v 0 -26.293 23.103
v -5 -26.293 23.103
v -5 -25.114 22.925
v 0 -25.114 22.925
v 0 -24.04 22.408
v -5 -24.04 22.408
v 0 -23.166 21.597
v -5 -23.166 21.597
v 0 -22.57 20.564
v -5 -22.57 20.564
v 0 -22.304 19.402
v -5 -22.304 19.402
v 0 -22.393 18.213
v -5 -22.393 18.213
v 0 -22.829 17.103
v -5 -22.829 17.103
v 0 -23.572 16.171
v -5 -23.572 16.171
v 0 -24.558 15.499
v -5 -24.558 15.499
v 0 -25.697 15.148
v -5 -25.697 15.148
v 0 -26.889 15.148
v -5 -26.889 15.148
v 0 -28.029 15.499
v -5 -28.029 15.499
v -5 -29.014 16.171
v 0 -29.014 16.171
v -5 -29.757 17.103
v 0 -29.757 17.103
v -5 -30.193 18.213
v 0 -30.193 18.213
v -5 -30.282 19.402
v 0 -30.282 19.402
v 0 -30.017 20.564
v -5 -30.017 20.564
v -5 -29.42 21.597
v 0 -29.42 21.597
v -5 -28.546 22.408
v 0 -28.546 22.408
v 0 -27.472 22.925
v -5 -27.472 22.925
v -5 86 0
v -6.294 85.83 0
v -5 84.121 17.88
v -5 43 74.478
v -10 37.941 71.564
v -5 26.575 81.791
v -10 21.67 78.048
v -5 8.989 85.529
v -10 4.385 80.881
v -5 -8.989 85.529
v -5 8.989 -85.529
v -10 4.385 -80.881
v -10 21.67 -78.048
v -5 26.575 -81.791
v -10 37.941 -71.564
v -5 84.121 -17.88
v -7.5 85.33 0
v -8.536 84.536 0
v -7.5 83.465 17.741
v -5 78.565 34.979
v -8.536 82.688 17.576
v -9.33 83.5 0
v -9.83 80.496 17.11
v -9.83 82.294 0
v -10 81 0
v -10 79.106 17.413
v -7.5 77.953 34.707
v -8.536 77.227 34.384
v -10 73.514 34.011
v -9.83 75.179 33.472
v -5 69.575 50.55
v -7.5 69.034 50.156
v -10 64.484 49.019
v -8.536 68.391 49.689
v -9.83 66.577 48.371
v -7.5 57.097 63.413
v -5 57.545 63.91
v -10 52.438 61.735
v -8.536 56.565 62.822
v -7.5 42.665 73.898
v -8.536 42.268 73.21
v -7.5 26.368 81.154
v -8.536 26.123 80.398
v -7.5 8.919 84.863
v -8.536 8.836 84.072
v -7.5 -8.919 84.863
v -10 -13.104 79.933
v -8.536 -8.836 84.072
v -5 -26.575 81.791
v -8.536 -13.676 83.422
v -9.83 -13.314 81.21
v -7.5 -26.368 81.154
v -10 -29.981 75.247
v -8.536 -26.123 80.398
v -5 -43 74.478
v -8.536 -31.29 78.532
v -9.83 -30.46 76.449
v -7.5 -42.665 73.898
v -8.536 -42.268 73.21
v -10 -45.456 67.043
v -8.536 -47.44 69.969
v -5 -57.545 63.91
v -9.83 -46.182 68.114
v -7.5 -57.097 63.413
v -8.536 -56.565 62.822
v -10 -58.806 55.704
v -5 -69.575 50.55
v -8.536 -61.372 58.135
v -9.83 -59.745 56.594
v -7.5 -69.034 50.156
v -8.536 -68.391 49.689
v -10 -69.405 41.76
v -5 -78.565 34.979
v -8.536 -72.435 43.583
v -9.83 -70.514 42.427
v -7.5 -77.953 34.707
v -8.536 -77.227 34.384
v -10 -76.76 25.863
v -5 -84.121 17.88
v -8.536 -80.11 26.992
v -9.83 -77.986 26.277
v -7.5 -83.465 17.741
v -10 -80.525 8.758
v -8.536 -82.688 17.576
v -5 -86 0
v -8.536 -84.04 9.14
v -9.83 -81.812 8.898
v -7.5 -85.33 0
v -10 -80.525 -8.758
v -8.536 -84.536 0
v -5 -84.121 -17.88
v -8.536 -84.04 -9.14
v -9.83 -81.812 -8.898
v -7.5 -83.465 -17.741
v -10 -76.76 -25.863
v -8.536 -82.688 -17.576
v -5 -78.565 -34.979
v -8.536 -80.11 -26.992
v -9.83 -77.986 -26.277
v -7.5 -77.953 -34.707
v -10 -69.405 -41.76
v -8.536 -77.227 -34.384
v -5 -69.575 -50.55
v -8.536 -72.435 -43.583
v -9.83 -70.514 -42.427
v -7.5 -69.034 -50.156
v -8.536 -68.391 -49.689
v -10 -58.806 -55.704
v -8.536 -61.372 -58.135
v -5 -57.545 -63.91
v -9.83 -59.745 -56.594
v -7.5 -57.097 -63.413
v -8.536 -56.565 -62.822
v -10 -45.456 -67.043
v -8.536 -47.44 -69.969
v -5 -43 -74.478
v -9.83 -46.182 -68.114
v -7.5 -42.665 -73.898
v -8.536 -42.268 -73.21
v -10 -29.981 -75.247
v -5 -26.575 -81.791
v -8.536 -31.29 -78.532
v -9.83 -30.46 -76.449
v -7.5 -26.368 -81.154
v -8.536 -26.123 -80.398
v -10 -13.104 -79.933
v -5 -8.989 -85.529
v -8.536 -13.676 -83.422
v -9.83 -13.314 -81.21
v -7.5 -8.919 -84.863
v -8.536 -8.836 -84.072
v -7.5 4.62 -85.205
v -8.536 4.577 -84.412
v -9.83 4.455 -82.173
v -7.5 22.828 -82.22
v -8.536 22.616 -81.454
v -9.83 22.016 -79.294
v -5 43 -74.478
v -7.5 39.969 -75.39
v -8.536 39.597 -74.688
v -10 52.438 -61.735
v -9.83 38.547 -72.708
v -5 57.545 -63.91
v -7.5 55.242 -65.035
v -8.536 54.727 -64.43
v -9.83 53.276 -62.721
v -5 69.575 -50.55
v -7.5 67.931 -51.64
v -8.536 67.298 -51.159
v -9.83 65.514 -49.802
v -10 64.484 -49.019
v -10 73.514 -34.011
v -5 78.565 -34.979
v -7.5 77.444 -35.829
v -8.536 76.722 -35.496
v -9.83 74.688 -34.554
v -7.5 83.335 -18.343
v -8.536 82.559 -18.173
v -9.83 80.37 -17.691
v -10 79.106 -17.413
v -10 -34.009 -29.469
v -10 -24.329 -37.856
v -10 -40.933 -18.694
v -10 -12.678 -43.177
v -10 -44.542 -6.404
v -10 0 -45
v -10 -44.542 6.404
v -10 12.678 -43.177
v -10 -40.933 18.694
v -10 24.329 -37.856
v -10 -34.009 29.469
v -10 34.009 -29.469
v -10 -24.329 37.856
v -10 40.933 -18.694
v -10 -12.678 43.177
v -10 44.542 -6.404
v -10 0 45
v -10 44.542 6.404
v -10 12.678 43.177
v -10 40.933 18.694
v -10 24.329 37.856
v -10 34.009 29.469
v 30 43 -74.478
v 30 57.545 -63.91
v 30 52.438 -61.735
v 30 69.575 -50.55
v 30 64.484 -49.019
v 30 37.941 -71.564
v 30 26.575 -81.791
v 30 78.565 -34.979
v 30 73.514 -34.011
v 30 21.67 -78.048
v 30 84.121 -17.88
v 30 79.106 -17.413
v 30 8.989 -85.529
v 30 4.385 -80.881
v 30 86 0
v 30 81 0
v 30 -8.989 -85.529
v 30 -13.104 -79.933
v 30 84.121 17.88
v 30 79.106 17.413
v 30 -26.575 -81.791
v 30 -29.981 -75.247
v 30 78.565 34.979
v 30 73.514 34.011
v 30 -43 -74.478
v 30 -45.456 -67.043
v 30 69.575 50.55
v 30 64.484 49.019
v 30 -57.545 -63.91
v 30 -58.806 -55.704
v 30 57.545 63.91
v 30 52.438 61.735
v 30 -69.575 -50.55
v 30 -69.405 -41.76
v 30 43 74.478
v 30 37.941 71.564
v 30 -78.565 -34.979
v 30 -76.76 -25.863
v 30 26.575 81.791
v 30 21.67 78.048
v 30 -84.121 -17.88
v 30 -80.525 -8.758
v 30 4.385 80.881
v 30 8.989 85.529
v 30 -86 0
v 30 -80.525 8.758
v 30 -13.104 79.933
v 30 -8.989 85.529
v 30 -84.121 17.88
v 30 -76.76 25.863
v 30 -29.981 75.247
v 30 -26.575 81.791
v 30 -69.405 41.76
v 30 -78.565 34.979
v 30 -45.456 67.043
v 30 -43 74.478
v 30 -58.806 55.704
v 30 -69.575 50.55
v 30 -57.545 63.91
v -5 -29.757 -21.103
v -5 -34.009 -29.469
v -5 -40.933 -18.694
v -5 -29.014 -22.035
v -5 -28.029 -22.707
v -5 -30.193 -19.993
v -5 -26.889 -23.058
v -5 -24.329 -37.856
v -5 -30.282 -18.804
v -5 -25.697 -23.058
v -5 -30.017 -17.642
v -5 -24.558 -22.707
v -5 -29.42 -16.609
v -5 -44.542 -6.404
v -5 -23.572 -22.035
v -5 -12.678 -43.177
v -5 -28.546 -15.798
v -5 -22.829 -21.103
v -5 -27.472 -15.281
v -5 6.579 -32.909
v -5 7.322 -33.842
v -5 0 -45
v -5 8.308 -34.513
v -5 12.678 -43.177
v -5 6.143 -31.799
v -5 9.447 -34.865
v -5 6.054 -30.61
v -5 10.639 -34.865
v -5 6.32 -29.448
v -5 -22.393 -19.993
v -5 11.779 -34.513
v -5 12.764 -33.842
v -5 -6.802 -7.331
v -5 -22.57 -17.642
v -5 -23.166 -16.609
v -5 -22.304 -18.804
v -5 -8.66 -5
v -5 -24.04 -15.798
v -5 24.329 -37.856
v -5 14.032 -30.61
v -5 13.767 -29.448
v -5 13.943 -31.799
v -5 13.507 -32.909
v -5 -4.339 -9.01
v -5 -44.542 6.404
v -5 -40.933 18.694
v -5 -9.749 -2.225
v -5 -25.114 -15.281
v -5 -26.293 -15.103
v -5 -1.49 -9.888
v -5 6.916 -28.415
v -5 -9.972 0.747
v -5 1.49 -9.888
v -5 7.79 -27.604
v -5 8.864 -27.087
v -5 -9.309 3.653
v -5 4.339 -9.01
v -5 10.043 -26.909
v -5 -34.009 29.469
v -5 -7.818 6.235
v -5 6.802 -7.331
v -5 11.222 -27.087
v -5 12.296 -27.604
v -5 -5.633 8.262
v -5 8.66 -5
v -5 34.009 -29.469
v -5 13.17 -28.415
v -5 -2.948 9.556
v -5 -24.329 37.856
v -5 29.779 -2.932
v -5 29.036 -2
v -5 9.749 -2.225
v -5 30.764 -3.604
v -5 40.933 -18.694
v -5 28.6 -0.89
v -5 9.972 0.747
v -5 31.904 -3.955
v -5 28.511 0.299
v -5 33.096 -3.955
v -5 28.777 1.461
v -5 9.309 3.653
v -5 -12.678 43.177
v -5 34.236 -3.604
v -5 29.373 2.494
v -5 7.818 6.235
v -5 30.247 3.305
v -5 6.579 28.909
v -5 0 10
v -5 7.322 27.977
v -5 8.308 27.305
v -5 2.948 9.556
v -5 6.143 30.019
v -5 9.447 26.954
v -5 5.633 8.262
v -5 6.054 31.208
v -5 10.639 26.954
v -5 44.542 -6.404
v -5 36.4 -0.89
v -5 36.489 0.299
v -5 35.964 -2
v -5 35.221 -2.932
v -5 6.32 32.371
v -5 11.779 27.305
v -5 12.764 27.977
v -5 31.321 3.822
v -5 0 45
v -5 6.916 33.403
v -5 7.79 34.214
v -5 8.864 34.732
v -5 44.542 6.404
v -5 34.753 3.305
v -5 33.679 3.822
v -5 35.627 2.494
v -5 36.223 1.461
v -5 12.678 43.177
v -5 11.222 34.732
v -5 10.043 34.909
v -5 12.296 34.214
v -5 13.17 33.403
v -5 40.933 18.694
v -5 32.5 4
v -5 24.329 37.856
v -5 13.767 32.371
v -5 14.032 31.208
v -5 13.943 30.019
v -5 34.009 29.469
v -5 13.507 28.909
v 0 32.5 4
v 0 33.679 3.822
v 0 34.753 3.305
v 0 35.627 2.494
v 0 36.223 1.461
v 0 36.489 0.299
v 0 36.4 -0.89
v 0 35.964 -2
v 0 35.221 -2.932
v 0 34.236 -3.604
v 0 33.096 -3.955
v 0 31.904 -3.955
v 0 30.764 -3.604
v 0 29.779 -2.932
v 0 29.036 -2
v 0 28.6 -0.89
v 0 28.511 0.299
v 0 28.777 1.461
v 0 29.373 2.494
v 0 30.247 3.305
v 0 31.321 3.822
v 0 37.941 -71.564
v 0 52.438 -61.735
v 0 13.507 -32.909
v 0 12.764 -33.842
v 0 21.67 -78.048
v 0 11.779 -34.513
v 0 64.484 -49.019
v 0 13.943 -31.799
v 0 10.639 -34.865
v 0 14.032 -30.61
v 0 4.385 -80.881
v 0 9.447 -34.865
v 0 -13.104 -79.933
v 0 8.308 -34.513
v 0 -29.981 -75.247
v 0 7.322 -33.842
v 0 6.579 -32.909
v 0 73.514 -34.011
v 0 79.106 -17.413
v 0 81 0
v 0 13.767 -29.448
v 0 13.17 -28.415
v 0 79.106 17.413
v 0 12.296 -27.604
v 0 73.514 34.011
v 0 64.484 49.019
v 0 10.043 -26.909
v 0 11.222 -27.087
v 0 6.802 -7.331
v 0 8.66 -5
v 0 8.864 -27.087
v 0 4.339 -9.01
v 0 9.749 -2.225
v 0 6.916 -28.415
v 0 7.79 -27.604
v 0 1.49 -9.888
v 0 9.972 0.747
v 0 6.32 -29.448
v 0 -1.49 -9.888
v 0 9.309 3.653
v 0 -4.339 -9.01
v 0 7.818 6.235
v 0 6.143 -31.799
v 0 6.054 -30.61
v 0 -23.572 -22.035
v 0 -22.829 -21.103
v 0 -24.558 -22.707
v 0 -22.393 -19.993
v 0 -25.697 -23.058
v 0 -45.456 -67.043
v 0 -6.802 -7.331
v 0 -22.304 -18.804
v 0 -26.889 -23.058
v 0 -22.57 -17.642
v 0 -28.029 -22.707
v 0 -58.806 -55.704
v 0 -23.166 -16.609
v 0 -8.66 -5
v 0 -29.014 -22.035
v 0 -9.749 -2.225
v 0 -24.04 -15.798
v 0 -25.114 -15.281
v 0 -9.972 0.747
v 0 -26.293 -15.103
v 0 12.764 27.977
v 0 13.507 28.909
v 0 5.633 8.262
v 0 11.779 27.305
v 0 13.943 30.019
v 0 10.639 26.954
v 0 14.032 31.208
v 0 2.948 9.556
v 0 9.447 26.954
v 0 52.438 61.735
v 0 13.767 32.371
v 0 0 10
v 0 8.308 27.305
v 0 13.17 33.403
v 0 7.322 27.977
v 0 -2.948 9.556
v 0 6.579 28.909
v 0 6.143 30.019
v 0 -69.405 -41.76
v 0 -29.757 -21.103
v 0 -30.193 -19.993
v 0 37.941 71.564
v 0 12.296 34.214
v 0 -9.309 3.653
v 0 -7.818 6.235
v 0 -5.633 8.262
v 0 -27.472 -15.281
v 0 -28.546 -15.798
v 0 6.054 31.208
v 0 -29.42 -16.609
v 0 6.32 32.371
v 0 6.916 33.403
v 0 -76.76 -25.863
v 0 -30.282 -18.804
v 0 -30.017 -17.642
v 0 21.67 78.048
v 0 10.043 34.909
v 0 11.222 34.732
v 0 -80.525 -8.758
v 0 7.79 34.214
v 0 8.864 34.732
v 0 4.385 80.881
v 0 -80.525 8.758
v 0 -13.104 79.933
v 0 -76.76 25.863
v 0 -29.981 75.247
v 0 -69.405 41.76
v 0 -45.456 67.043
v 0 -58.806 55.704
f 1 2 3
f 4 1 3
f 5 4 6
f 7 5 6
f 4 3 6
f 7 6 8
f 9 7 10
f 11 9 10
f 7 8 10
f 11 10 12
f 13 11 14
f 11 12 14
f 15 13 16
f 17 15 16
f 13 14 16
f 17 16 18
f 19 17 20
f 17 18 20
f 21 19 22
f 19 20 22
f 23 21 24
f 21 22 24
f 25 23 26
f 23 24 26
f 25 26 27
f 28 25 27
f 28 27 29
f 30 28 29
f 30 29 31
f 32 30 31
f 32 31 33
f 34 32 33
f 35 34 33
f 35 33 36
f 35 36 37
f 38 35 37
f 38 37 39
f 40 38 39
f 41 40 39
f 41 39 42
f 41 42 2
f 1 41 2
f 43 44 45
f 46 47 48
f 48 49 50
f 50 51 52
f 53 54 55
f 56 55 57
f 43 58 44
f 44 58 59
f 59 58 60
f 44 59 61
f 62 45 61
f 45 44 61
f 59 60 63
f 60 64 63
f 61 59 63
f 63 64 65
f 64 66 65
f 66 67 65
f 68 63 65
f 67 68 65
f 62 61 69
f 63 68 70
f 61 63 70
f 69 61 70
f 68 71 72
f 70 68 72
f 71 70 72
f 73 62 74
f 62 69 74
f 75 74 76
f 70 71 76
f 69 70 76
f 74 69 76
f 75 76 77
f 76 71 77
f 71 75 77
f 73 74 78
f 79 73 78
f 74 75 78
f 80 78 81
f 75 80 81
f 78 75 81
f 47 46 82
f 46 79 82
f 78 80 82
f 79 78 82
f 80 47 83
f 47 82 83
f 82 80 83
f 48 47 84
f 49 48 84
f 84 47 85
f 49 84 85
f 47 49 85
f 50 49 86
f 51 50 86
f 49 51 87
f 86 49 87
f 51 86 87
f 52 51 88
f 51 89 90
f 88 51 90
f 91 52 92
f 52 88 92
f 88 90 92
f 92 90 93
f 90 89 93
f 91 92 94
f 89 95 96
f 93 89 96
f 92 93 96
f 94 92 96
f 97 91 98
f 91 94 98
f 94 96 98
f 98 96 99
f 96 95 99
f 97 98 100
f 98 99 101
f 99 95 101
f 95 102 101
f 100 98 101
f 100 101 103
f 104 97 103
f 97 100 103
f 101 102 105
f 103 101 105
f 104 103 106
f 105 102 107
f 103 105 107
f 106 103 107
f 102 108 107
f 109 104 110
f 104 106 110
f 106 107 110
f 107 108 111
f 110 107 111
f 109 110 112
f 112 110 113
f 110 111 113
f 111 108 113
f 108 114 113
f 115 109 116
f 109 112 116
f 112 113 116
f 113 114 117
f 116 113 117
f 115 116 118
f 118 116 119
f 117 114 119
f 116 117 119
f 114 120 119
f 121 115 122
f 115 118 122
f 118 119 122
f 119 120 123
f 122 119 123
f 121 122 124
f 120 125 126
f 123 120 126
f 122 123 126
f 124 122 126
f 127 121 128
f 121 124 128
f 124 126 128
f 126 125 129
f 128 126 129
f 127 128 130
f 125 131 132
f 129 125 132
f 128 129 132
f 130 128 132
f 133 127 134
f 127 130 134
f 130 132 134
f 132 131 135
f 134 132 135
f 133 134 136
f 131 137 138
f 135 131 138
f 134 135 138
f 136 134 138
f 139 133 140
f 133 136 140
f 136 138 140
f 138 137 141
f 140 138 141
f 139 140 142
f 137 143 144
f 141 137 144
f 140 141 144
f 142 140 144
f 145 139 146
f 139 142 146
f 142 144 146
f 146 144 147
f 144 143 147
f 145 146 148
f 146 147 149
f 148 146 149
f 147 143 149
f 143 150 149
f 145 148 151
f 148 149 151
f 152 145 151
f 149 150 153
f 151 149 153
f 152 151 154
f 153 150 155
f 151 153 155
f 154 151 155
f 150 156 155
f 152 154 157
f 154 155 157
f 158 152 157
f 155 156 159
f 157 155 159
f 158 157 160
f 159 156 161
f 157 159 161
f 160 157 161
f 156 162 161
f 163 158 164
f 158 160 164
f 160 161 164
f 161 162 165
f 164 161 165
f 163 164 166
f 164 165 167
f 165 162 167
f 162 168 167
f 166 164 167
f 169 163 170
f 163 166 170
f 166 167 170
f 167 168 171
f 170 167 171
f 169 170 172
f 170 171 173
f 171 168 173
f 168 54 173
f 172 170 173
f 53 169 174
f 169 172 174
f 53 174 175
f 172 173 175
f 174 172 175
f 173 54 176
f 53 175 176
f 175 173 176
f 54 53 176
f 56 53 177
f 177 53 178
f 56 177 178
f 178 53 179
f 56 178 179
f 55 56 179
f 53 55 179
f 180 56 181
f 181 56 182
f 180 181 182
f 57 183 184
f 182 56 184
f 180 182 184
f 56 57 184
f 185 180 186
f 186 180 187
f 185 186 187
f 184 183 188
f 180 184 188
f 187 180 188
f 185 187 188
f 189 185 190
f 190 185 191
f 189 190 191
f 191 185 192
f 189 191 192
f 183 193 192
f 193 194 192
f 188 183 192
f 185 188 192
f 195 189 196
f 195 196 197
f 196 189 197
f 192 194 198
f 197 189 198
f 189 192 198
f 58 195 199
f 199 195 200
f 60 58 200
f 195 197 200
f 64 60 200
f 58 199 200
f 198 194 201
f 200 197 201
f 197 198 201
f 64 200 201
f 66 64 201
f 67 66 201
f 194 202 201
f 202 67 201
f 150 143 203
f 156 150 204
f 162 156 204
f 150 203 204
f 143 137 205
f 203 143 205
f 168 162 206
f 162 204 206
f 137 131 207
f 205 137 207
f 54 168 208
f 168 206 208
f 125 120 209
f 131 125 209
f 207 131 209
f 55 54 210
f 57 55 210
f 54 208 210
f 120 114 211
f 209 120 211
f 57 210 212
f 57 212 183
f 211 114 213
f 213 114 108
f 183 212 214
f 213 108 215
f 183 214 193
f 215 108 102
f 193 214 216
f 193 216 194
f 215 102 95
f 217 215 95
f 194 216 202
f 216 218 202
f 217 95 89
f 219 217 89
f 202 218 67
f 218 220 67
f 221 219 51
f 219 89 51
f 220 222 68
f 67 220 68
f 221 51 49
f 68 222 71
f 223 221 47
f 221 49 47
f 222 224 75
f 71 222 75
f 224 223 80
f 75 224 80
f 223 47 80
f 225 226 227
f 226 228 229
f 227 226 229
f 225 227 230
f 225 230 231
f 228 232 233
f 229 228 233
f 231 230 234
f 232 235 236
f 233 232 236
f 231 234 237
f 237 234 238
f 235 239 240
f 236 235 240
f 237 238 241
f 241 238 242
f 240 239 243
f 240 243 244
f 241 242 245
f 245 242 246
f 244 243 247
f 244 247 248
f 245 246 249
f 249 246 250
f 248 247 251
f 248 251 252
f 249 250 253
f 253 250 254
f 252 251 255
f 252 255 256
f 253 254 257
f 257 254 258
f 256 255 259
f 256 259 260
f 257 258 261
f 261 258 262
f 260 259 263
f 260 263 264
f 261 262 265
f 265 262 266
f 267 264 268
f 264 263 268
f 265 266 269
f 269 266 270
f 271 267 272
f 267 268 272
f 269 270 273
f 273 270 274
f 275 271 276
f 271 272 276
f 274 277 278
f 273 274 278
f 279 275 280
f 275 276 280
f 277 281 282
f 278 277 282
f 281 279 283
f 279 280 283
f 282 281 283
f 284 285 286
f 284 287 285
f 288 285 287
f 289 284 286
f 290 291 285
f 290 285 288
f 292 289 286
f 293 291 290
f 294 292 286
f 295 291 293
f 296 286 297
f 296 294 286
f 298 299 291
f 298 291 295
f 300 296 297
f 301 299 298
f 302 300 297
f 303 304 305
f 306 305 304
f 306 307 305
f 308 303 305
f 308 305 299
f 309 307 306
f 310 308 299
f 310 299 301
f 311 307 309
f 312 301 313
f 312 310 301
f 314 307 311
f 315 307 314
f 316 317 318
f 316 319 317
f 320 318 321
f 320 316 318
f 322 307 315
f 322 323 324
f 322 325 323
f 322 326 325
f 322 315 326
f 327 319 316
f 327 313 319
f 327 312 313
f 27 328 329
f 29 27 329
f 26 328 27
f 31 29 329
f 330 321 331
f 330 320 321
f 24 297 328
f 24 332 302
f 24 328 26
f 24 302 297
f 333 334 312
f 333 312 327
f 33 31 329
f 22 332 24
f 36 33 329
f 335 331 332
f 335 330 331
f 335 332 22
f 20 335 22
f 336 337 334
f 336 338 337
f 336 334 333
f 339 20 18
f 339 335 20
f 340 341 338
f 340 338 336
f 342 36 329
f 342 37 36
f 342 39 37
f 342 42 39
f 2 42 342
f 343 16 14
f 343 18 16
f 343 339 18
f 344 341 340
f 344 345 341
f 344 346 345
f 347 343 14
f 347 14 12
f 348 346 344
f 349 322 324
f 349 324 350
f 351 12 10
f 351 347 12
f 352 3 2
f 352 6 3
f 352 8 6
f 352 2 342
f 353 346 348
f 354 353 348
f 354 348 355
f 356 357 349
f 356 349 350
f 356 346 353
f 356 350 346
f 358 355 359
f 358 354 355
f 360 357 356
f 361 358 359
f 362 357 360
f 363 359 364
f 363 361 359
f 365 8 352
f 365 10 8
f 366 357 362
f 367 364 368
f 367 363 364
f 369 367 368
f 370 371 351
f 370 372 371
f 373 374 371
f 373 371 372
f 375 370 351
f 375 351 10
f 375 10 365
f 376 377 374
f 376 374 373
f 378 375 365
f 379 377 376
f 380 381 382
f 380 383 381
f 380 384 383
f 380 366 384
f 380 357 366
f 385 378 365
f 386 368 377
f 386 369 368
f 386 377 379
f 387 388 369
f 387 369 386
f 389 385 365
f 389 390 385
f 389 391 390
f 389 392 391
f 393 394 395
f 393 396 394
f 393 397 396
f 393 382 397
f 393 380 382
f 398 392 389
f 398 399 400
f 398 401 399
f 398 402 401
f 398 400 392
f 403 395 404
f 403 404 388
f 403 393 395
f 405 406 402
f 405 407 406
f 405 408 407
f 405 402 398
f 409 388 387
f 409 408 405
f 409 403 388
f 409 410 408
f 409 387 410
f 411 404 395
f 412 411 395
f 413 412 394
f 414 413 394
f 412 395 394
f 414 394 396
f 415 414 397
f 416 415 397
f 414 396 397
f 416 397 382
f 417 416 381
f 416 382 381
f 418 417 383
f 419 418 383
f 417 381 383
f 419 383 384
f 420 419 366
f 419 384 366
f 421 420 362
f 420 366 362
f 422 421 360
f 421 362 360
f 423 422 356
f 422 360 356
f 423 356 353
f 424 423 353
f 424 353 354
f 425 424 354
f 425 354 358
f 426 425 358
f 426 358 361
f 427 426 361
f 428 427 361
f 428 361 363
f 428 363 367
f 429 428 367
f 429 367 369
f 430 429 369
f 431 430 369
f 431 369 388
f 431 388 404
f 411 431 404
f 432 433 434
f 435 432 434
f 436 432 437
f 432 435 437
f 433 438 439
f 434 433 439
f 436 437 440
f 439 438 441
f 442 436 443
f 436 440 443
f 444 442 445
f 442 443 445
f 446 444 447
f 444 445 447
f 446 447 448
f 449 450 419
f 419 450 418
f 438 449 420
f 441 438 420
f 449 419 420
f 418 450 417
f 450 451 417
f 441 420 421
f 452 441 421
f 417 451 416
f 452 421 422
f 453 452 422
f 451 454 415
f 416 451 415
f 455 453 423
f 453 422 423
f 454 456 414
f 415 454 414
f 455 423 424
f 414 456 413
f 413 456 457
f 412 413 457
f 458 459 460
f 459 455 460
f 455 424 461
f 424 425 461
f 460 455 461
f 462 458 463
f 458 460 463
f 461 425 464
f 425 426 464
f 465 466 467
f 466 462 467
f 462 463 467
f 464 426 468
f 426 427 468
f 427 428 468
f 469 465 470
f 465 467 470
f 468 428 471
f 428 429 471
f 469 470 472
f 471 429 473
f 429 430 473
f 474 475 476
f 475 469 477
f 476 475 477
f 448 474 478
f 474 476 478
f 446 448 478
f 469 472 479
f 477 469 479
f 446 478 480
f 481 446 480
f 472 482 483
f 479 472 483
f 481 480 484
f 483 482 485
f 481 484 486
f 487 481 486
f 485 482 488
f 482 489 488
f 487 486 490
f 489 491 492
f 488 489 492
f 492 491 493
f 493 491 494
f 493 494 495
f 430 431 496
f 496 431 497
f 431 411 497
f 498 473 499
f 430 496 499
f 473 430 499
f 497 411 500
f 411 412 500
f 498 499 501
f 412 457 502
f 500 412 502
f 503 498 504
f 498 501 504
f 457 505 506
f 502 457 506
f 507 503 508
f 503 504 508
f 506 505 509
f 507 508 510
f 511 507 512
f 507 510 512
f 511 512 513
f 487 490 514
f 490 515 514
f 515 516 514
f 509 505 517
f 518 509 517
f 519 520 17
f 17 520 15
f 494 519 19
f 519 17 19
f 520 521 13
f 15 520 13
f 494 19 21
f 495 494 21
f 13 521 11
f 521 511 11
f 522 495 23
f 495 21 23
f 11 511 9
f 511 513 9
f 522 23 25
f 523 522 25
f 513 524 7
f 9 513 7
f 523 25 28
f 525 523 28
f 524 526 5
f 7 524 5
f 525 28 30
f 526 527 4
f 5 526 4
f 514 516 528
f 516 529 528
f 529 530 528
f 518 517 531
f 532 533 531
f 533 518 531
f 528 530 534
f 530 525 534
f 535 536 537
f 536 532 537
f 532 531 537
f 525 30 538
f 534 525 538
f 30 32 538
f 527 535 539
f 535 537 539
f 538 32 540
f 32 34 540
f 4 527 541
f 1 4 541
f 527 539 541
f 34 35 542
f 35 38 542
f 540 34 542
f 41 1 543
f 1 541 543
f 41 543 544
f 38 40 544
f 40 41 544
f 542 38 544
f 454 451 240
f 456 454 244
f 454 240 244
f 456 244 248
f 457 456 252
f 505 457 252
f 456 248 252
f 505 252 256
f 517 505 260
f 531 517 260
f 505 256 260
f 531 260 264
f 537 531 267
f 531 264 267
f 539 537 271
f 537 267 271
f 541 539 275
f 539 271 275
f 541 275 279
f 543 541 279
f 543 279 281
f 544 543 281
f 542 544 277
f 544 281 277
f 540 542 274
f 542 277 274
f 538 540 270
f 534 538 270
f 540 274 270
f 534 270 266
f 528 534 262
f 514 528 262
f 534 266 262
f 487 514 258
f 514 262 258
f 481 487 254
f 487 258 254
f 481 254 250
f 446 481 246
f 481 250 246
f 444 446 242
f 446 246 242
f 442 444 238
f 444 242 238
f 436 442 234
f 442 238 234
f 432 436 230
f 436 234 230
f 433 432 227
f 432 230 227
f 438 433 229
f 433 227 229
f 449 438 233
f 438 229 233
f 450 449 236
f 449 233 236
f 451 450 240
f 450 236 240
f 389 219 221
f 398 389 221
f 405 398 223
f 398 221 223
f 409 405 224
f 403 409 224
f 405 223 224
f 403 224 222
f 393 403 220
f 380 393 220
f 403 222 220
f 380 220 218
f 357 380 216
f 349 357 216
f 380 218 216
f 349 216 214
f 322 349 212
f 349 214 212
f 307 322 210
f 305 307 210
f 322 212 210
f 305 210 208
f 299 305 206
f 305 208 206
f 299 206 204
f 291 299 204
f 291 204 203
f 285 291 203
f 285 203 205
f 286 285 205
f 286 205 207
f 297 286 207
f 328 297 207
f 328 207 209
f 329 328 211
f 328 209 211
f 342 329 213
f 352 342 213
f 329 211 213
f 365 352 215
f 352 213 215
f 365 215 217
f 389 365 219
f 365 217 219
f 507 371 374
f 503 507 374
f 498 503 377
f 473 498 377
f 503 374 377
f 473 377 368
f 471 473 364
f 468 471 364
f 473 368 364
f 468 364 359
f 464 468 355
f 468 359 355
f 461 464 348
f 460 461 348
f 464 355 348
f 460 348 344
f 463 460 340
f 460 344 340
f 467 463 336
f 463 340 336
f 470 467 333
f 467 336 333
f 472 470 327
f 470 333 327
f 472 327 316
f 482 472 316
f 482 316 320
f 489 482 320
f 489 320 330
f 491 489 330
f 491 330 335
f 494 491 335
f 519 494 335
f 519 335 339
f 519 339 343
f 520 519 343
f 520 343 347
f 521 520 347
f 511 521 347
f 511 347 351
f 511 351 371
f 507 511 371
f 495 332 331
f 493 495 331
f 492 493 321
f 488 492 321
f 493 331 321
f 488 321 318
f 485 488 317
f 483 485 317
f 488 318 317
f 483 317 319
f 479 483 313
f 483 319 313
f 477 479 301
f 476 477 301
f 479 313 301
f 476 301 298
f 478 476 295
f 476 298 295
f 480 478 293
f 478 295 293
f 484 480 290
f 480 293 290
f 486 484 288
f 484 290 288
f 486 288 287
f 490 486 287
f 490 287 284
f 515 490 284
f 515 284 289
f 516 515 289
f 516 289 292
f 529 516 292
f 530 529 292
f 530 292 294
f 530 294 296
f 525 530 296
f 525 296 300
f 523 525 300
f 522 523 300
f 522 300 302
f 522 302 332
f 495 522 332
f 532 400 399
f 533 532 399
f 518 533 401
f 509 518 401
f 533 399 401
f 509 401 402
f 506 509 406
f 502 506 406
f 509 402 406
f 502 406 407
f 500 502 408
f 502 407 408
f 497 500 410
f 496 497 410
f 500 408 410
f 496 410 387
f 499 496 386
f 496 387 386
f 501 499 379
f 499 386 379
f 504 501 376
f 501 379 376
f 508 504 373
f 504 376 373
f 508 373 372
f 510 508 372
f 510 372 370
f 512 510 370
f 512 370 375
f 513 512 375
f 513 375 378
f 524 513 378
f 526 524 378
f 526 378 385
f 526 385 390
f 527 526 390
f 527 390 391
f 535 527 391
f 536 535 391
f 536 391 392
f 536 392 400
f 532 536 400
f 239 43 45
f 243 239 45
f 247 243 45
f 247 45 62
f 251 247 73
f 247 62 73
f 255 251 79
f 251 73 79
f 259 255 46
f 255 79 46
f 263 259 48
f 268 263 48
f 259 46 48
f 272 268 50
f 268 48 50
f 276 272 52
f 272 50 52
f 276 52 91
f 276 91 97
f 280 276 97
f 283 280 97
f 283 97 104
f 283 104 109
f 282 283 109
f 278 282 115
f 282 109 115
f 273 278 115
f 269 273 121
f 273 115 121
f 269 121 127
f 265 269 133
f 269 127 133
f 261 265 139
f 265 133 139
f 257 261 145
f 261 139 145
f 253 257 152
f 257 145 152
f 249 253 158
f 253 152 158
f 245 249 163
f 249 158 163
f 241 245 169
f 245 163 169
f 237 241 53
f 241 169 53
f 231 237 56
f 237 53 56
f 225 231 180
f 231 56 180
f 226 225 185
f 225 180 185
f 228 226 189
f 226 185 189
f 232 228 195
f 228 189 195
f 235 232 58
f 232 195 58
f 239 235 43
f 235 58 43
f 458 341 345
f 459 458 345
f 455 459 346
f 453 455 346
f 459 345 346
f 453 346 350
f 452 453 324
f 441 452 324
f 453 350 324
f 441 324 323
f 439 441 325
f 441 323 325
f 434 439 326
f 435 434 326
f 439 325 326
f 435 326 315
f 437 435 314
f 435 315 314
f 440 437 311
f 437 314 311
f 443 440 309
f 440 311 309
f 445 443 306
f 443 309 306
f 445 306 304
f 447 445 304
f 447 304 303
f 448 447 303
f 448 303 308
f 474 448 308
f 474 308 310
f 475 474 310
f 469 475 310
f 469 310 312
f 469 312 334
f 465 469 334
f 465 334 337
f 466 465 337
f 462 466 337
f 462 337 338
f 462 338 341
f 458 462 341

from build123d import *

# Parameters (mm, degrees)
FILLET1_R          = 5
SKETCH2_R          = 45
CUT_EXTRUDE1_DEPTH = 5
SKETCH3_R          = 10
CUT_EXTRUDE2_DEPTH = 41
CUT_EXTRUDE3_REACH = 37
SKETCH4_R          = 4


with BuildPart() as part:
    # Sketch1 → Revolve1 (revolve)
    with BuildSketch(Plane.XY):
        Polygon((0, 0), (0, 81), (30, 81), (30, 86), (-10, 86), (-10, 0), align=None)
    revolve(axis=Axis((-10, 0, 0), (1, 0, 0)))

    # Fillet1
    fillet1_edges = [part.edges().sort_by_distance(p)[0] for p in [
        (-10, -86, 0),
    ]]
    fillet(fillet1_edges, radius=FILLET1_R)

    # Sketch2 → Cut-Extrude1 (cut)
    with BuildSketch(Plane.ZY.offset(10)):
        Circle(SKETCH2_R)
    extrude(amount=-CUT_EXTRUDE1_DEPTH, mode=Mode.SUBTRACT)

    # Sketch3 → Cut-Extrude2 (cut, through all)
    with BuildSketch(Plane.ZY.offset(10)):
        Circle(SKETCH3_R)
    extrude(amount=-CUT_EXTRUDE2_DEPTH, mode=Mode.SUBTRACT)

    # Sketch4 → Cut-Extrude3 (cut, up to next)
    with BuildSketch(Plane.ZY.offset(5), mode=Mode.PRIVATE) as cut_extrude3_sk1:
        with Locations((0, 32.5)):
            Circle(SKETCH4_R)
    cut_extrude3_tool1 = extrude(cut_extrude3_sk1.sketch, amount=-CUT_EXTRUDE3_REACH, mode=Mode.PRIVATE) & part.part
    add(cut_extrude3_tool1.solids().sort_by_distance((-5, 32.5, 0))[0], mode=Mode.SUBTRACT)
    # Sketch4 → Cut-Extrude3 (cut, up to next)
    with BuildSketch(Plane.ZY.offset(5), mode=Mode.PRIVATE) as cut_extrude3_sk2:
        with Locations((30.90933678, 10.043052317)):
            Circle(SKETCH4_R)
    cut_extrude3_tool2 = extrude(cut_extrude3_sk2.sketch, amount=-CUT_EXTRUDE3_REACH, mode=Mode.PRIVATE) & part.part
    add(cut_extrude3_tool2.solids().sort_by_distance((-5, 10.043052, 30.909337))[0], mode=Mode.SUBTRACT)
    # Sketch4 → Cut-Extrude3 (cut, up to next)
    with BuildSketch(Plane.ZY.offset(5), mode=Mode.PRIVATE) as cut_extrude3_sk3:
        with Locations((19.1030207, -26.293052317)):
            Circle(SKETCH4_R)
    cut_extrude3_tool3 = extrude(cut_extrude3_sk3.sketch, amount=-CUT_EXTRUDE3_REACH, mode=Mode.PRIVATE) & part.part
    add(cut_extrude3_tool3.solids().sort_by_distance((-5, -26.293052, 19.103021))[0], mode=Mode.SUBTRACT)
    # Sketch4 → Cut-Extrude3 (cut, up to next)
    with BuildSketch(Plane.ZY.offset(5), mode=Mode.PRIVATE) as cut_extrude3_sk4:
        with Locations((-19.1030207, -26.293052317)):
            Circle(SKETCH4_R)
    cut_extrude3_tool4 = extrude(cut_extrude3_sk4.sketch, amount=-CUT_EXTRUDE3_REACH, mode=Mode.PRIVATE) & part.part
    add(cut_extrude3_tool4.solids().sort_by_distance((-5, -26.293052, -19.103021))[0], mode=Mode.SUBTRACT)
    # Sketch4 → Cut-Extrude3 (cut, up to next)
    with BuildSketch(Plane.ZY.offset(5), mode=Mode.PRIVATE) as cut_extrude3_sk5:
        with Locations((-30.90933678, 10.043052317)):
            Circle(SKETCH4_R)
    cut_extrude3_tool5 = extrude(cut_extrude3_sk5.sketch, amount=-CUT_EXTRUDE3_REACH, mode=Mode.PRIVATE) & part.part
    add(cut_extrude3_tool5.solids().sort_by_distance((-5, 10.043052, -30.909337))[0], mode=Mode.SUBTRACT)


solid = part.part
